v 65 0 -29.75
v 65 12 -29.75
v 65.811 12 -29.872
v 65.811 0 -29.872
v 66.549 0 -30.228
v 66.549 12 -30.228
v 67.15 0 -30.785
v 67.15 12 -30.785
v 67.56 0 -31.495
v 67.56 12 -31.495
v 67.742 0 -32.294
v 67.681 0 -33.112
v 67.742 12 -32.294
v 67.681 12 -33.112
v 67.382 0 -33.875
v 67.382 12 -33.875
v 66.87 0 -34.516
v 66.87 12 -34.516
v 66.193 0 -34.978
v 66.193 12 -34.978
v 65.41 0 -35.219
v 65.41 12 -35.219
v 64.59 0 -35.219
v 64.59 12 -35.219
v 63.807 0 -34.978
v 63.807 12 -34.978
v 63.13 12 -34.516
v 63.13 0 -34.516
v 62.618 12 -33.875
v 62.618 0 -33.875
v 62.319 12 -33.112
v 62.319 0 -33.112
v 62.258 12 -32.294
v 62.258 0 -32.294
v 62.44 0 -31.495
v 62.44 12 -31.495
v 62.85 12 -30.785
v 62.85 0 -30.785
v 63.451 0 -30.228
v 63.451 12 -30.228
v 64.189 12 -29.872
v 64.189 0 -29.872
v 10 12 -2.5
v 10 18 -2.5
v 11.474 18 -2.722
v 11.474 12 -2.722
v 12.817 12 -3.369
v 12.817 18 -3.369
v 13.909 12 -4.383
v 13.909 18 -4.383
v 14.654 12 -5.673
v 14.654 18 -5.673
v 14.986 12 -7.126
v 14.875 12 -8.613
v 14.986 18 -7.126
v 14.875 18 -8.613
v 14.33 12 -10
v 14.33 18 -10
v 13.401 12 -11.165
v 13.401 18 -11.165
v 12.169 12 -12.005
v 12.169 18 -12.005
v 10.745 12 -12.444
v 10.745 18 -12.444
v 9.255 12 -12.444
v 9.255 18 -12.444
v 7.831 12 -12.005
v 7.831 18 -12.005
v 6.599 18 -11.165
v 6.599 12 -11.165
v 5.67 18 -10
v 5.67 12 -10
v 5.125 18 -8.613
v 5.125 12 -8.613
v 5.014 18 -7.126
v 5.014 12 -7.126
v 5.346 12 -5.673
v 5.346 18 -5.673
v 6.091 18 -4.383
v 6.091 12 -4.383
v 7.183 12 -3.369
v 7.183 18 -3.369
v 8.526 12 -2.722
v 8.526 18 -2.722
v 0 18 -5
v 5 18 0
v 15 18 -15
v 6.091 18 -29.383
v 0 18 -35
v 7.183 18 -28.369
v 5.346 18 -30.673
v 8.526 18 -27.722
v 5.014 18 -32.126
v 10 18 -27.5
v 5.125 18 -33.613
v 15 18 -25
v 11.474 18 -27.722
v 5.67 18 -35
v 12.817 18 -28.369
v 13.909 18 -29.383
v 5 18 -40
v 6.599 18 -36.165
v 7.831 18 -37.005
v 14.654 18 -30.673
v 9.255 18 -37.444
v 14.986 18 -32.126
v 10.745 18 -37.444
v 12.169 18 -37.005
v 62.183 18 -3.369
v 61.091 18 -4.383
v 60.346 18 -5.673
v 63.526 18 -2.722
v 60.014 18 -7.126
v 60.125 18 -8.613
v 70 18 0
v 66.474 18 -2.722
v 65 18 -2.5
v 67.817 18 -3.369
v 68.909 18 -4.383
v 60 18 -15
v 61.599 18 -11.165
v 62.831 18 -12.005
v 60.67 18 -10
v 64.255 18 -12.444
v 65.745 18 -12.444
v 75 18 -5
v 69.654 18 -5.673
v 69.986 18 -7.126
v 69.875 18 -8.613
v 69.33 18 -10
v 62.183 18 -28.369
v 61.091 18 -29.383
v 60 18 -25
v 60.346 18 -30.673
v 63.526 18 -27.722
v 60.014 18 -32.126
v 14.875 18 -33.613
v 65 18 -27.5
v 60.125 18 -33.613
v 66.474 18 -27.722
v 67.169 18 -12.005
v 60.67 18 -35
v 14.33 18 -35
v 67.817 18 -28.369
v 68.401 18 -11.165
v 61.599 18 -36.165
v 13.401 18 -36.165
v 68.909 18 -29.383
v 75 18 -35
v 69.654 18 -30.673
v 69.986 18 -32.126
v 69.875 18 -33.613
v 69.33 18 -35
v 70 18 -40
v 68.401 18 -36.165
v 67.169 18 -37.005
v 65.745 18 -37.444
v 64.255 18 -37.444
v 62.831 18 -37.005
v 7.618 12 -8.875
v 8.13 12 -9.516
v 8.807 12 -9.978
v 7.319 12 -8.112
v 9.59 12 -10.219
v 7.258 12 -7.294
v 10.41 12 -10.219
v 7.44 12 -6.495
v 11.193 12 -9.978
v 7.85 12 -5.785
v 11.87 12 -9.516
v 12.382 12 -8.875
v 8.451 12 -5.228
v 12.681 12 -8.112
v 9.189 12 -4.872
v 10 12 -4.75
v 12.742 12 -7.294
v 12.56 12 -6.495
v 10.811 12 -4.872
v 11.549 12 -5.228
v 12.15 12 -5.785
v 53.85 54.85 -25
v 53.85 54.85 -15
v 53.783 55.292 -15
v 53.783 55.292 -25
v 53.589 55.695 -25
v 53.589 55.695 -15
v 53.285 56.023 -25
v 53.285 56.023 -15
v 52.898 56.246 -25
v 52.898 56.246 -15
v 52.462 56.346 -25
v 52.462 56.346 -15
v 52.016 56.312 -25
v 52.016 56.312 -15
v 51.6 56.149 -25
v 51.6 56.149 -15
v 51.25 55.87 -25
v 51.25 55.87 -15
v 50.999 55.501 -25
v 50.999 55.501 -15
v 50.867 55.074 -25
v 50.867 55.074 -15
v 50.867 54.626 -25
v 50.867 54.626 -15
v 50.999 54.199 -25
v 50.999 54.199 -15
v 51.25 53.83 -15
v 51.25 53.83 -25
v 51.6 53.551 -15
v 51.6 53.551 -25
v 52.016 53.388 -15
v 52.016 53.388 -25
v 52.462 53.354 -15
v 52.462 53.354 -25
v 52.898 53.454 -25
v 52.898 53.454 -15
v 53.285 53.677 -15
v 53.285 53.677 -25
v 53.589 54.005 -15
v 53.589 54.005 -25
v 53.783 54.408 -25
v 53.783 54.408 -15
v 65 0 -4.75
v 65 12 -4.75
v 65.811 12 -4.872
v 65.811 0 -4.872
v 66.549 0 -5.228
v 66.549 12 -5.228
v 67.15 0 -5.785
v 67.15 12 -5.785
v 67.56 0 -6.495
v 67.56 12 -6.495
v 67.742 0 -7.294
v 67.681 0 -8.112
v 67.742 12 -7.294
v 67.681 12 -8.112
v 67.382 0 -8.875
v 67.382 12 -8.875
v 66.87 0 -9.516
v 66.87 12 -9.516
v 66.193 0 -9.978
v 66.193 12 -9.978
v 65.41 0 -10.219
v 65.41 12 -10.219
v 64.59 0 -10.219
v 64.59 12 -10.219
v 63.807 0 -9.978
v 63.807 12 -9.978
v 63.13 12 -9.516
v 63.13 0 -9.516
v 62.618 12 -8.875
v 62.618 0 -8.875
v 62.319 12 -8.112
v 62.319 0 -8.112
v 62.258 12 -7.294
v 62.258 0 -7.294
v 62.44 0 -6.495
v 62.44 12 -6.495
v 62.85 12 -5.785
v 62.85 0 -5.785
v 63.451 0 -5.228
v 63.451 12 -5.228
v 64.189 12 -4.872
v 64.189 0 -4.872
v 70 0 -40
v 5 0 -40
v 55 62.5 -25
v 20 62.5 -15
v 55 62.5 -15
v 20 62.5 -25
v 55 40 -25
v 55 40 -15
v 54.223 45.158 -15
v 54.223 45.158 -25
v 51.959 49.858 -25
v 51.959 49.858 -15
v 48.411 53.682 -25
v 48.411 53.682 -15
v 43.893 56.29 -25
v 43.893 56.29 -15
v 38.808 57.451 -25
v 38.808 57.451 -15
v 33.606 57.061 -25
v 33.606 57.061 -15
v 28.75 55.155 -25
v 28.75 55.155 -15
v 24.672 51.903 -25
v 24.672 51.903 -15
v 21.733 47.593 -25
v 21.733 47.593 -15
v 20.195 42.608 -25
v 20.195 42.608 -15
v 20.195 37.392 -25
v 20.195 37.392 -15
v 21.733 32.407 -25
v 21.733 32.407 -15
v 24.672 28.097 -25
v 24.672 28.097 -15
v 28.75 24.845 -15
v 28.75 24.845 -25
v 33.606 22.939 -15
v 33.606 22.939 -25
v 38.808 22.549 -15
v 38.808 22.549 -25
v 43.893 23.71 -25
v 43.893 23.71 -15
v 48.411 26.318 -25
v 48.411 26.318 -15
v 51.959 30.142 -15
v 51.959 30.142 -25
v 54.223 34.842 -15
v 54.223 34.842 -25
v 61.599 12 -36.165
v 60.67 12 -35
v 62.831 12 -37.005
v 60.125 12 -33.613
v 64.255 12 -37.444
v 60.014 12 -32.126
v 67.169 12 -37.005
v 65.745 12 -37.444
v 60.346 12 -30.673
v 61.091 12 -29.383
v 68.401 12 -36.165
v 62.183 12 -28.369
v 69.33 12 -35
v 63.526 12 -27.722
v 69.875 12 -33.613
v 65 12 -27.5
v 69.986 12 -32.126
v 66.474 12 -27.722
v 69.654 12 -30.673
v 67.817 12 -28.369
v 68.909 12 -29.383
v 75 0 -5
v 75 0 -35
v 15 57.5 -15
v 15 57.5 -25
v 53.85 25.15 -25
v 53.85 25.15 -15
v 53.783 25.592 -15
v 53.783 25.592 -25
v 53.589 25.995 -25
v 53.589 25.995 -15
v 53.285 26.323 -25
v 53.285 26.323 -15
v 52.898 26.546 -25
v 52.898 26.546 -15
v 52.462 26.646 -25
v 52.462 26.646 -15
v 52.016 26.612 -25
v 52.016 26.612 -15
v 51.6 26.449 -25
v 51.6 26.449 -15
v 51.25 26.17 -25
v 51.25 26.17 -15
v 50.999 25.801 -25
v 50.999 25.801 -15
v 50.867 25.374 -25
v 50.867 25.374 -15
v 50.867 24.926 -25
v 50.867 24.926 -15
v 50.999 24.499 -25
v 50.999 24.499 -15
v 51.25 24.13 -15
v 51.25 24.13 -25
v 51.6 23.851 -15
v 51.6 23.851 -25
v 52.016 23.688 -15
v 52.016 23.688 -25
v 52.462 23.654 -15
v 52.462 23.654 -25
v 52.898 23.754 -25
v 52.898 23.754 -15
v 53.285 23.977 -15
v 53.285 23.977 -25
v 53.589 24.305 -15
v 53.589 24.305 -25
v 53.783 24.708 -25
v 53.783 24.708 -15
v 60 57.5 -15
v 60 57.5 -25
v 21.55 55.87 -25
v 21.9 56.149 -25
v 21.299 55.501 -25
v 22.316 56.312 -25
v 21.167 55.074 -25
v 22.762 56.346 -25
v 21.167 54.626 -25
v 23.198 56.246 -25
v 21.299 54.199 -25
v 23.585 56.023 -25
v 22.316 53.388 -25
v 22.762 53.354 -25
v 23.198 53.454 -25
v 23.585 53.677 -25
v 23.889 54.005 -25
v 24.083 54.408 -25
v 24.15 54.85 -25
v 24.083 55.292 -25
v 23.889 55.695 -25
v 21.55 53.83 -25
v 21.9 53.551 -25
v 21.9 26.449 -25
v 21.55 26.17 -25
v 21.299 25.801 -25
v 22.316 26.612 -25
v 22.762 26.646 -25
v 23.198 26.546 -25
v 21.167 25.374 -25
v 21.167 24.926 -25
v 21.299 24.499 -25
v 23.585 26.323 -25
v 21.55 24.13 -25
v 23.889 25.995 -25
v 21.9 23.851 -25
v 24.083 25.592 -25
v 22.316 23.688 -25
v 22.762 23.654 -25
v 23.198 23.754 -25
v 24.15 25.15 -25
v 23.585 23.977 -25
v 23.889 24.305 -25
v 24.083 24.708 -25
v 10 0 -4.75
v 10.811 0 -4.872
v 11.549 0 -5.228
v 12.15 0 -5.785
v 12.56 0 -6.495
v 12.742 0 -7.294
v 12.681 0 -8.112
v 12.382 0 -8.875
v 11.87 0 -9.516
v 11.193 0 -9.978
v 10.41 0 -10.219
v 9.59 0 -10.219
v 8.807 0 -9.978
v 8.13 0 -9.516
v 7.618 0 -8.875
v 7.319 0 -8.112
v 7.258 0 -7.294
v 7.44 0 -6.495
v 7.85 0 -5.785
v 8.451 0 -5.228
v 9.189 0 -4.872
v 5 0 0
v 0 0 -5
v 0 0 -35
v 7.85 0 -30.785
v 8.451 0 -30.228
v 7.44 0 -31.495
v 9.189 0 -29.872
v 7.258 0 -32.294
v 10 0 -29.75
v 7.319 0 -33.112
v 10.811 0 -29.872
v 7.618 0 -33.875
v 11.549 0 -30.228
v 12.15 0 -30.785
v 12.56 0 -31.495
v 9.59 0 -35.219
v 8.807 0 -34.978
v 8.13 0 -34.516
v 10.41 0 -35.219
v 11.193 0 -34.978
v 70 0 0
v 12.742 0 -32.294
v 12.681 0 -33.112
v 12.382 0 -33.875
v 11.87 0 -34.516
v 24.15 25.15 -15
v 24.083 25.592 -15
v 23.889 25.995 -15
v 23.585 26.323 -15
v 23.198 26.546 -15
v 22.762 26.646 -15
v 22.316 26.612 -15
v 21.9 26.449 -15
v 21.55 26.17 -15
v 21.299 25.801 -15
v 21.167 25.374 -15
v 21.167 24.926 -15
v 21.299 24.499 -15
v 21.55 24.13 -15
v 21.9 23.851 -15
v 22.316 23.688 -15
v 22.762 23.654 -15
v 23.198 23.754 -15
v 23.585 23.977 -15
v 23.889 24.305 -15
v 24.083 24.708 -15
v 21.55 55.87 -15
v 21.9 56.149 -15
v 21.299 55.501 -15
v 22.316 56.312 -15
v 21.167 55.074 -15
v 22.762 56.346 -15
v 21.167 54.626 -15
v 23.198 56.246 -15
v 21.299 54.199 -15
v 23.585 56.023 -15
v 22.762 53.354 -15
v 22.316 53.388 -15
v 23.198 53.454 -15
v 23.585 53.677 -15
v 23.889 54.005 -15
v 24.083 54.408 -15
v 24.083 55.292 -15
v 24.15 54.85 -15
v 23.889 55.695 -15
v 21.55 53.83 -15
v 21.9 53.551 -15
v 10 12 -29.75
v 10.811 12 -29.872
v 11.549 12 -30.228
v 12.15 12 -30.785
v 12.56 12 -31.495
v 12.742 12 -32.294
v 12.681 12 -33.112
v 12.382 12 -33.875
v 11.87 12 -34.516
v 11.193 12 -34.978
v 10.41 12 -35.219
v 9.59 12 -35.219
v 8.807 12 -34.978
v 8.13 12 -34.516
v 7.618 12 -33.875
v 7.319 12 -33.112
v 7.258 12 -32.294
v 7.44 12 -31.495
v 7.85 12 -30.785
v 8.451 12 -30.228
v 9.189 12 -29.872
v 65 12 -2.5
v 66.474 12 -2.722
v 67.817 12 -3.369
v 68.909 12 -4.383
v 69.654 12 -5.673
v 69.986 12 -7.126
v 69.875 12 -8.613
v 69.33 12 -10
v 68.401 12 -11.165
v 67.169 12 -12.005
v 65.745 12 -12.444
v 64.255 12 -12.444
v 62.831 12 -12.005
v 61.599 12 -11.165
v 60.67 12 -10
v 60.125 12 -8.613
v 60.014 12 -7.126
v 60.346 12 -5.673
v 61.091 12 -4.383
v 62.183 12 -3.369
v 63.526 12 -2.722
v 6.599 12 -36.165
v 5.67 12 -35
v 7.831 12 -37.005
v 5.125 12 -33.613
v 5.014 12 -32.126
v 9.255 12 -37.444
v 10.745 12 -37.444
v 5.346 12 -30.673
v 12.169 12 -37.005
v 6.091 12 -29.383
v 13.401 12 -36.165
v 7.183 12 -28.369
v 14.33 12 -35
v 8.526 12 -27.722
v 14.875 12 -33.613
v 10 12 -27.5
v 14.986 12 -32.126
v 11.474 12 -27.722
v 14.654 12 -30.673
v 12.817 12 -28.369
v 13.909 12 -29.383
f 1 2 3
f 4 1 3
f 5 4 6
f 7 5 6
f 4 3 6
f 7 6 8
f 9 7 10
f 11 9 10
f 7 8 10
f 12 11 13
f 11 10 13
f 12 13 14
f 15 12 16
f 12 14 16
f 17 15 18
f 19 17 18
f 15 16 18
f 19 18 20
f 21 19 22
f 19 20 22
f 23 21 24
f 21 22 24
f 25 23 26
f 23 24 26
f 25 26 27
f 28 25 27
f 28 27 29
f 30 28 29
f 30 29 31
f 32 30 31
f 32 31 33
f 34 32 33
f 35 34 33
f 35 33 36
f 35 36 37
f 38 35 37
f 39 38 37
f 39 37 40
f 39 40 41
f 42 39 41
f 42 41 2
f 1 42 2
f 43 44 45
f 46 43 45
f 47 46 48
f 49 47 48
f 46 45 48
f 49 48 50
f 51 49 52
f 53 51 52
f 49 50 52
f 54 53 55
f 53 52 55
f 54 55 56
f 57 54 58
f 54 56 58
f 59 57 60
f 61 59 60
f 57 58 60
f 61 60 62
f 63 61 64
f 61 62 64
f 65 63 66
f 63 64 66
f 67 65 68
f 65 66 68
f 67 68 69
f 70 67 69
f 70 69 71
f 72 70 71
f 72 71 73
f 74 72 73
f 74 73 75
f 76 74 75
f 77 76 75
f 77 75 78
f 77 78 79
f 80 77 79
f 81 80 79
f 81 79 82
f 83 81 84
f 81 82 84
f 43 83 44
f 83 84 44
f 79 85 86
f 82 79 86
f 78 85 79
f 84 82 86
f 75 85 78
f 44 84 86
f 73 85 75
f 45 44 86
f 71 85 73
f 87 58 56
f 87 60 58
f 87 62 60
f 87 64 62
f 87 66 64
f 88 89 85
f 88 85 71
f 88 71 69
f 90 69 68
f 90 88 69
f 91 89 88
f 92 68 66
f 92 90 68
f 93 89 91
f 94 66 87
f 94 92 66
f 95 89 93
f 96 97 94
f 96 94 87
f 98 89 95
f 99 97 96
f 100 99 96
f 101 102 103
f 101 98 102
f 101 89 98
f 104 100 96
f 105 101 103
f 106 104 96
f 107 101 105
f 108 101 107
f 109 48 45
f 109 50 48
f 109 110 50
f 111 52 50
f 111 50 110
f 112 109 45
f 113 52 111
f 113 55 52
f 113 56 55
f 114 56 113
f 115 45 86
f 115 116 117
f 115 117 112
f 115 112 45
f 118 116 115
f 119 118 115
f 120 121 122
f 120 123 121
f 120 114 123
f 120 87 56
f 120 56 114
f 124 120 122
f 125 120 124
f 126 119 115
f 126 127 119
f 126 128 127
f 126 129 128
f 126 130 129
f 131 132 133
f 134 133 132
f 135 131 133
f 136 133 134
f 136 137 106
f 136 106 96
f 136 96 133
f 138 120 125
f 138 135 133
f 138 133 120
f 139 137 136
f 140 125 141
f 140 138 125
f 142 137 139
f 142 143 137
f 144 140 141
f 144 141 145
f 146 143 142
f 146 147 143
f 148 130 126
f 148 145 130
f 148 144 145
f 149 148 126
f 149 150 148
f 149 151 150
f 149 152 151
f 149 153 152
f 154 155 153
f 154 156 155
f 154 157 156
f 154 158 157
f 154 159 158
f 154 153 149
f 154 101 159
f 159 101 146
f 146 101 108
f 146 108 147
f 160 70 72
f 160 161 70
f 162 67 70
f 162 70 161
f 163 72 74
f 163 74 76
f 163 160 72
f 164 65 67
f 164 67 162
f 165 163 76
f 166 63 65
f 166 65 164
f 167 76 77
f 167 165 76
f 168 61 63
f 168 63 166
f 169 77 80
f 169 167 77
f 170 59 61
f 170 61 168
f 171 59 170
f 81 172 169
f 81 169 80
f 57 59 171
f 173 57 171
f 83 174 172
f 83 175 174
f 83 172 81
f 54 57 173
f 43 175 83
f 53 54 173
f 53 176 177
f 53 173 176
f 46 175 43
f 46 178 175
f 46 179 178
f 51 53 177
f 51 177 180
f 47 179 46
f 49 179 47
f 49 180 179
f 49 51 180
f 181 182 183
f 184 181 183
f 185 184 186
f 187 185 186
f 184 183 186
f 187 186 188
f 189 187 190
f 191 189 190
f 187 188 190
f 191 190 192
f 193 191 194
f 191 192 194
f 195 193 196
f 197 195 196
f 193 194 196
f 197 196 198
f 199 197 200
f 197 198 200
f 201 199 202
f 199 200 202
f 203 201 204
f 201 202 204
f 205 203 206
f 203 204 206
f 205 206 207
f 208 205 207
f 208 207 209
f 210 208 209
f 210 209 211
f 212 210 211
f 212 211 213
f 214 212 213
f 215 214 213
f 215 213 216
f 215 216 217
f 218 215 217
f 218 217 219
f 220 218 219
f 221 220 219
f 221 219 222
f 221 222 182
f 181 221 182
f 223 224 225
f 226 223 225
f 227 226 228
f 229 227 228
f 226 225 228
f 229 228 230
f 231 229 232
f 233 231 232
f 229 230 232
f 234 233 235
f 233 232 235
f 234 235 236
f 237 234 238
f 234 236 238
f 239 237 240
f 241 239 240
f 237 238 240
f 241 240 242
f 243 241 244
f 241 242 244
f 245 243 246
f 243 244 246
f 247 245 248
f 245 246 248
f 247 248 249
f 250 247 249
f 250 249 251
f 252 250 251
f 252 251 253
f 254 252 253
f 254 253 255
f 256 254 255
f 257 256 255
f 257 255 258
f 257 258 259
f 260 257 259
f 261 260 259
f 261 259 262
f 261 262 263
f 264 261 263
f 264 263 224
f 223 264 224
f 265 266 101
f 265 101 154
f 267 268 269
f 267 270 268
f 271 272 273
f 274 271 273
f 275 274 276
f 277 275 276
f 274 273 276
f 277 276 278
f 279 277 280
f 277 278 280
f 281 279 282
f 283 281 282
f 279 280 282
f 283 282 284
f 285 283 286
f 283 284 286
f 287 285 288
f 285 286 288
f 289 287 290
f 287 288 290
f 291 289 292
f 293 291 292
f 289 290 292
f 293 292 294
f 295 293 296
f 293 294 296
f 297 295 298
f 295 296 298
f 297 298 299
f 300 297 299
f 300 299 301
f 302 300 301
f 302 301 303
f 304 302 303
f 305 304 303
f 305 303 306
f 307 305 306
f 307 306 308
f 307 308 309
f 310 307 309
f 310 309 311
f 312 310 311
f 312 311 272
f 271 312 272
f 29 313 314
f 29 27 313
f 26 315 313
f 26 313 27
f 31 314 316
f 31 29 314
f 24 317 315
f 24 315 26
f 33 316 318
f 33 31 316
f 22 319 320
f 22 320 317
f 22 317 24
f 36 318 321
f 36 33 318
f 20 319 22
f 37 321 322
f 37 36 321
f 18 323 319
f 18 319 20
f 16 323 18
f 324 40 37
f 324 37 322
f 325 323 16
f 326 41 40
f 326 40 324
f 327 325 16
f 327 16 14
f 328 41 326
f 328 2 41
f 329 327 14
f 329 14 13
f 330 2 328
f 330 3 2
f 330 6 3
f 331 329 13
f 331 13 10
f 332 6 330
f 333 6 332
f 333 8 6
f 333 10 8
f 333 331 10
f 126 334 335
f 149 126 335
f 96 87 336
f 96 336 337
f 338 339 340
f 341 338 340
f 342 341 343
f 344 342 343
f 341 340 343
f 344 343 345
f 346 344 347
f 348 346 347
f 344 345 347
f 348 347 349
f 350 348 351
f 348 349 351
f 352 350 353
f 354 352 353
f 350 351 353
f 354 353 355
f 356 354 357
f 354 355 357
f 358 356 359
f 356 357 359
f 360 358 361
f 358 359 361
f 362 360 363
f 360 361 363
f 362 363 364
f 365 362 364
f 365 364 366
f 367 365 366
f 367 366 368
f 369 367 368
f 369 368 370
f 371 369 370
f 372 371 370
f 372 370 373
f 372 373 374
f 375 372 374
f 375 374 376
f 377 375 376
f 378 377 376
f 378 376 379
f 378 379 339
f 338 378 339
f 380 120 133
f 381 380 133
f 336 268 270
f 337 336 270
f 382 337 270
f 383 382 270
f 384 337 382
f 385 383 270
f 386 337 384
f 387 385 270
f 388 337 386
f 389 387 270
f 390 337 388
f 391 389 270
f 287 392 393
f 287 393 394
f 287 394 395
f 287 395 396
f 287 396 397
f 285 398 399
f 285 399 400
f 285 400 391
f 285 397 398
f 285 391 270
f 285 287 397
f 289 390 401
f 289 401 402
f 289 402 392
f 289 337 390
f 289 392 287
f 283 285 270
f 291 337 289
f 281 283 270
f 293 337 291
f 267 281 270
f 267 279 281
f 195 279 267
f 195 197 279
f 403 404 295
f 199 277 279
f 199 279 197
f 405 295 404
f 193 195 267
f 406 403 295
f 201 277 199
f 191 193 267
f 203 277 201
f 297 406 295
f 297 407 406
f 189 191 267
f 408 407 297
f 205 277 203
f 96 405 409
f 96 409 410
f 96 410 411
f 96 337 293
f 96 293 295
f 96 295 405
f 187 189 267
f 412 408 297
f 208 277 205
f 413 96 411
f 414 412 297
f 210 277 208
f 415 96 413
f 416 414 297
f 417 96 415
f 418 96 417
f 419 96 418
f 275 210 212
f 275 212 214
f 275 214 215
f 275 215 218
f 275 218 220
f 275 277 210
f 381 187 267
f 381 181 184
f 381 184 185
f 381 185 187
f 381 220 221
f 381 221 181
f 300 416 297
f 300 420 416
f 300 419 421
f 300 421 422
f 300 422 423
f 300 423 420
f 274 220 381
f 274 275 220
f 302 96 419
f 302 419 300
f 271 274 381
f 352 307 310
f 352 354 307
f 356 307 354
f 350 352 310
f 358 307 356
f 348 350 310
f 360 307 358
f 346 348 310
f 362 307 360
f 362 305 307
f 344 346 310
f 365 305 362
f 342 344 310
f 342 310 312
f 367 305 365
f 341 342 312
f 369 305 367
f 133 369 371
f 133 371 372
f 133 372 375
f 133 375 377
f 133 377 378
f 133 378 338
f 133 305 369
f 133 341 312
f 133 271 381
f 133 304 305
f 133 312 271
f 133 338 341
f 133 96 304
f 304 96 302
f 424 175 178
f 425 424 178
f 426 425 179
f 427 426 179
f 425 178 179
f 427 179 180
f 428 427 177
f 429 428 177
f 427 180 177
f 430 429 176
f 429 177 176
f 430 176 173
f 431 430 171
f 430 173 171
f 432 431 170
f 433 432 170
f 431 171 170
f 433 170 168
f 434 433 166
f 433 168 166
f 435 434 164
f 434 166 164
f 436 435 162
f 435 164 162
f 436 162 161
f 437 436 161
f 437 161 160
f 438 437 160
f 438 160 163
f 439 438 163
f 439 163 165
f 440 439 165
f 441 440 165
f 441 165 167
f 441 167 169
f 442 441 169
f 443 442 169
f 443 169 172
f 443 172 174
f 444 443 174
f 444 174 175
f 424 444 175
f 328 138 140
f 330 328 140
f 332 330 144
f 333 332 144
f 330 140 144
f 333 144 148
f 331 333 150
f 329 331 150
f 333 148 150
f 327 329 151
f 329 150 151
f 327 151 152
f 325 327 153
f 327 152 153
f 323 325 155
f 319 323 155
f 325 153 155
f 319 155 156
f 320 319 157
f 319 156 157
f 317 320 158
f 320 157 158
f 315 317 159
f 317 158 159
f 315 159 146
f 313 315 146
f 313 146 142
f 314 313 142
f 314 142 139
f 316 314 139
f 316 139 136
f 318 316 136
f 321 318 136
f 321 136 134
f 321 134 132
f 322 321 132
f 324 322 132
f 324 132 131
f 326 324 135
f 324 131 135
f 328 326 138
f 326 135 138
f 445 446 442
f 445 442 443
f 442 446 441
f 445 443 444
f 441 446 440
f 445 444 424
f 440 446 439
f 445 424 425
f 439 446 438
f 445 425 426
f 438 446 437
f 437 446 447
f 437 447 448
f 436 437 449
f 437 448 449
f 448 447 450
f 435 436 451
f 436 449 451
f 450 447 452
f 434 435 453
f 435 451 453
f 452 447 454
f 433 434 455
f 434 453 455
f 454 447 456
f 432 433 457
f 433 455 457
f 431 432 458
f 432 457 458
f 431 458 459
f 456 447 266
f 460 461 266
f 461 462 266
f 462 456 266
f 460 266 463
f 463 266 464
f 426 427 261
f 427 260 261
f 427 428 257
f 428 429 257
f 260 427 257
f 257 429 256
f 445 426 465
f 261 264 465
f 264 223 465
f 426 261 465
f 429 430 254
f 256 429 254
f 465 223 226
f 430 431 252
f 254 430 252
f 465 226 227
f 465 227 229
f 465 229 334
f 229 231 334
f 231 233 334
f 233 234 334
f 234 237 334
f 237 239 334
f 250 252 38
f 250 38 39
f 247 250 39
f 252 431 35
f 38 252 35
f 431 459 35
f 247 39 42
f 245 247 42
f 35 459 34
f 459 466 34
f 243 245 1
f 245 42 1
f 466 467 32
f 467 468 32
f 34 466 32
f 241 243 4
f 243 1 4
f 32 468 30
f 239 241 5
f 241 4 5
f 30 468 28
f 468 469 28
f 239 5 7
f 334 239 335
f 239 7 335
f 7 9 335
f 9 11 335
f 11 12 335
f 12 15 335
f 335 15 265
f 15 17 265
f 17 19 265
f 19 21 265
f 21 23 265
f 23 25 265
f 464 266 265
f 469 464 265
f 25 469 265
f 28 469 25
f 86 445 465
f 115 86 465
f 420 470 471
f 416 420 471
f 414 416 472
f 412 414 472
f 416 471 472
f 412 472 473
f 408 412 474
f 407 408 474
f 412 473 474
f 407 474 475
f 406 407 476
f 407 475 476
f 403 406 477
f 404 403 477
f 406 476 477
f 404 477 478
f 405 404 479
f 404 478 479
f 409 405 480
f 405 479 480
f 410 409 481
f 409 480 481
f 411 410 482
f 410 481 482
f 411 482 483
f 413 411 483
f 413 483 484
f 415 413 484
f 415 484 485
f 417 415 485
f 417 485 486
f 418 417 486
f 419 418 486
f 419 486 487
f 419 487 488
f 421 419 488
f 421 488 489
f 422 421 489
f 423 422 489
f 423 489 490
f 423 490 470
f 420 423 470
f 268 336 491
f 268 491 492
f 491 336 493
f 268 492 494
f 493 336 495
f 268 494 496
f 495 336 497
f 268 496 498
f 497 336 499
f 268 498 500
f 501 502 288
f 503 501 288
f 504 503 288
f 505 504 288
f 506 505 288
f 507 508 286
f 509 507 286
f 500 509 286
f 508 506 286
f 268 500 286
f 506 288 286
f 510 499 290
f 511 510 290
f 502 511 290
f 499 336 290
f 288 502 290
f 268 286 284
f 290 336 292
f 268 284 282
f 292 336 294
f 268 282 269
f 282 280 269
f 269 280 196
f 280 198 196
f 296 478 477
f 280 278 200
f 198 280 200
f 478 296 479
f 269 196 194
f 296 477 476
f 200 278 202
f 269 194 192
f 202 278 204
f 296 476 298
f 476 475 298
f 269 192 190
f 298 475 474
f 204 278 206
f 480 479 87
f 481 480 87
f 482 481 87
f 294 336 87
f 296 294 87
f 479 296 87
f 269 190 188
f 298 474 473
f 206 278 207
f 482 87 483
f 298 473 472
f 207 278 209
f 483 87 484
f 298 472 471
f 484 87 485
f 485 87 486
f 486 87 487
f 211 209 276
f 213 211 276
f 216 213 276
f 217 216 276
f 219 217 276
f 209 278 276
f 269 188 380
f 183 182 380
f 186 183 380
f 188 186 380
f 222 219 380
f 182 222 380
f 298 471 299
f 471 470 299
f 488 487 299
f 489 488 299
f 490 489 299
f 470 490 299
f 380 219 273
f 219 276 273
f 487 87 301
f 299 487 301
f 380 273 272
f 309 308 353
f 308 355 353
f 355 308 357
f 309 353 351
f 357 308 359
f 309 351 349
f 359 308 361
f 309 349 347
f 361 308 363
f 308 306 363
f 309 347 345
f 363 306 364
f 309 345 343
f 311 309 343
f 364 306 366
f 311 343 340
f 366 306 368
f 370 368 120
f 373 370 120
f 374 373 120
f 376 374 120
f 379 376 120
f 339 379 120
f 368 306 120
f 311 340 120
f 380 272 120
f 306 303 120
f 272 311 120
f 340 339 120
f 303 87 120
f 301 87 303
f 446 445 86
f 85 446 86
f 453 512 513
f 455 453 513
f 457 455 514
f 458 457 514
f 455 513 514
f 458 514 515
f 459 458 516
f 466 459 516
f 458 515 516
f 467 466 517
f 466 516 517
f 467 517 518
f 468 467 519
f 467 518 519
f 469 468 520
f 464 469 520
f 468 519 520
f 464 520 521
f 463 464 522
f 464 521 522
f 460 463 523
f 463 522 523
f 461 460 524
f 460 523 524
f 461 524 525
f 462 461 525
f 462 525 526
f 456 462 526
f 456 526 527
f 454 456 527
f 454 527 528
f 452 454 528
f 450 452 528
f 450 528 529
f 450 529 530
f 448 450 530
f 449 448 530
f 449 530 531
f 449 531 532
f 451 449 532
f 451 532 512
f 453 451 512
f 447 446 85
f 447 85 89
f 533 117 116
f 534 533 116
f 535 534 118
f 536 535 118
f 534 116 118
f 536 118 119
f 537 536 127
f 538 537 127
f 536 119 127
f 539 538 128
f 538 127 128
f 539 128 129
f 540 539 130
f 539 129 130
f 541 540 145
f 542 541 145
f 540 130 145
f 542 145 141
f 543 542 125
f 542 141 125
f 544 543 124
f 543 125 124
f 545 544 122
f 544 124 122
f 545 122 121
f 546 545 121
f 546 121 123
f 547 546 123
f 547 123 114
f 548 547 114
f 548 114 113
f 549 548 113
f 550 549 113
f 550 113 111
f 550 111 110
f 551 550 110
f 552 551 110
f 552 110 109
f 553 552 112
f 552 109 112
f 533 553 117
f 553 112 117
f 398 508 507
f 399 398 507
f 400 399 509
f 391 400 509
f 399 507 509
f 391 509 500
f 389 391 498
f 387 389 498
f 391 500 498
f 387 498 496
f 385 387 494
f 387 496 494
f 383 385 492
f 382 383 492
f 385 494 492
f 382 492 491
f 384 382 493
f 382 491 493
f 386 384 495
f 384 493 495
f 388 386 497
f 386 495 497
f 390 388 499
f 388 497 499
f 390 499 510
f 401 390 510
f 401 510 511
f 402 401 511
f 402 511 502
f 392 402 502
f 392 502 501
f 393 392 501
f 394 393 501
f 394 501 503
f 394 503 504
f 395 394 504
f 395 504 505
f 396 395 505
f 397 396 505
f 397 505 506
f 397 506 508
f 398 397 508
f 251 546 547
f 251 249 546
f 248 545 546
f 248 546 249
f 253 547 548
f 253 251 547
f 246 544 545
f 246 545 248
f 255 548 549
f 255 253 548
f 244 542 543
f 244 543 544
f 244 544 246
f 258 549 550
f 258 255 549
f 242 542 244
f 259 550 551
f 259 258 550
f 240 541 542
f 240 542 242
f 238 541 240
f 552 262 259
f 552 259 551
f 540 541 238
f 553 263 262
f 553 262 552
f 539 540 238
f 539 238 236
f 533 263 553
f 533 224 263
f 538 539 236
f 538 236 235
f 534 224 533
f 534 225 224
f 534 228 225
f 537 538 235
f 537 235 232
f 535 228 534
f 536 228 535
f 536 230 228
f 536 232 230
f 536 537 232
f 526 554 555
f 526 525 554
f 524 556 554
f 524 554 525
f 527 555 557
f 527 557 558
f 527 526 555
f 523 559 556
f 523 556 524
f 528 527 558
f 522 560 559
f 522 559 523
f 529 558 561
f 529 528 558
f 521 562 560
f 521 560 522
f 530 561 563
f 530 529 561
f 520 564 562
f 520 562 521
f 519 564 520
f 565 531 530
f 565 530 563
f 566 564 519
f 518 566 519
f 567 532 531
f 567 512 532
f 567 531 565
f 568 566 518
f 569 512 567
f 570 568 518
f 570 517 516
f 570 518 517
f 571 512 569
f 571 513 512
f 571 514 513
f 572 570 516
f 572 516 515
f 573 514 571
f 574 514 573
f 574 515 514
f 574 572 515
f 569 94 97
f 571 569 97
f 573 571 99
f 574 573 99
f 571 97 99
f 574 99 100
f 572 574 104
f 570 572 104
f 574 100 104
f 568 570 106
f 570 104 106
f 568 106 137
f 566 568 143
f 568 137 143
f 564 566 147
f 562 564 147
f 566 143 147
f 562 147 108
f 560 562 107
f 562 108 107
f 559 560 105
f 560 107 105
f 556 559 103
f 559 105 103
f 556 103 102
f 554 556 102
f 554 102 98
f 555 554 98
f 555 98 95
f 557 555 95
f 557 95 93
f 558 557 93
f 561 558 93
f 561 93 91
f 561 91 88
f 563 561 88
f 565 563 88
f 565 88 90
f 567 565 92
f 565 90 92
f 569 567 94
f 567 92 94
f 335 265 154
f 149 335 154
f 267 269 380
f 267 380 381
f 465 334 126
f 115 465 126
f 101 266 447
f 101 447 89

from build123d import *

# Parameters (mm, degrees)
SKETCH_1_W          = 75
SKETCH_1_H          = 40
EXTRUDE_1_DEPTH     = 18
CHAMFER_1_SIZE      = 5
SKETCH_2_W          = 45
SKETCH_2_H          = 10
EXTRUDE_2_DEPTH     = 44.5
CHAMFER_2_SIZE      = 5
SKETCH_3_R          = 17.5
CUT_EXTRUDE_1_DEPTH = 101.778221854
SKETCH_4_R          = 1.5
CUT_EXTRUDE_2_DEPTH = 101.778221854
SKETCH_5_R          = 5
CUT_EXTRUDE_3_DEPTH = 6
SKETCH_6_R          = 2.75
CUT_EXTRUDE_4_DEPTH = 99.869863963


with BuildPart() as part:
    # 스케치1 → 보스-돌출1 (new body)
    with BuildSketch(Plane(origin=(0, 0, 0), x_dir=(1, 0, 0), z_dir=(0, 1, 0))):
        with Locations((37.5, 20)):
            Rectangle(SKETCH_1_W, SKETCH_1_H)
    extrude(amount=EXTRUDE_1_DEPTH)

    # 모따기1
    chamfer_1_edges = [part.edges().sort_by_distance(p)[0] for p in [
        (0, 9, -40),
        (75, 9, -40),
        (75, 9, 0),
        (0, 9, 0),
    ]]
    chamfer(chamfer_1_edges, length=CHAMFER_1_SIZE)

    # 스케치2 → 보스-돌출2 (add)
    with BuildSketch(Plane(origin=(0, 18, 0), x_dir=(1, 0, 0), z_dir=(0, 1, 0))):
        with Locations((37.5, 20)):
            Rectangle(SKETCH_2_W, SKETCH_2_H)
    extrude(amount=EXTRUDE_2_DEPTH)

    # 모따기2
    chamfer_2_edges = [part.edges().sort_by_distance(p)[0] for p in [
        (15, 62.5, -20),
        (60, 62.5, -20),
    ]]
    chamfer(chamfer_2_edges, length=CHAMFER_2_SIZE)

    # 스케치3 → 컷-돌출1 (cut, through all)
    with BuildSketch(Plane.XY.offset(-15)):
        with Locations((37.5, 40)):
            Circle(SKETCH_3_R)
    extrude(amount=-CUT_EXTRUDE_1_DEPTH, mode=Mode.SUBTRACT)

    # 스케치4 → 컷-돌출2 (cut, through all)
    with BuildSketch(Plane.XY.offset(-15)):
        with Locations((22.65, 54.85)):
            Circle(SKETCH_4_R)
        with Locations((52.35, 54.85)):
            Circle(SKETCH_4_R)
        with Locations((52.35, 25.15)):
            Circle(SKETCH_4_R)
        with Locations((22.65, 25.15)):
            Circle(SKETCH_4_R)
    extrude(amount=-CUT_EXTRUDE_2_DEPTH, mode=Mode.SUBTRACT)

    # 스케치5 → 컷-돌출3 (cut)
    with BuildSketch(Plane(origin=(0, 18, 0), x_dir=(1, 0, 0), z_dir=(0, 1, 0))):
        with Locations(Location((10, 32.5, 0), (0, 0, 270))):
            Circle(SKETCH_5_R)
        with Locations(Location((10, 7.5, 0), (0, 0, 270))):
            Circle(SKETCH_5_R)
        with Locations(Location((65, 7.5, 0), (0, 0, 270))):
            Circle(SKETCH_5_R)
        with Locations(Location((65, 32.5, 0), (0, 0, 270))):
            Circle(SKETCH_5_R)
    extrude(amount=-CUT_EXTRUDE_3_DEPTH, mode=Mode.SUBTRACT)

    # 스케치6 → 컷-돌출4 (cut, through all)
    with BuildSketch(Plane(origin=(0, 12, 0), x_dir=(1, 0, 0), z_dir=(0, 1, 0))):
        with Locations(Location((10, 7.5, 0), (0, 0, 270))):
            Circle(SKETCH_6_R)
        with Locations(Location((10, 32.5, 0), (0, 0, 270))):
            Circle(SKETCH_6_R)
        with Locations(Location((65, 7.5, 0), (0, 0, 270))):
            Circle(SKETCH_6_R)
        with Locations(Location((65, 32.5, 0), (0, 0, 270))):
            Circle(SKETCH_6_R)
    extrude(amount=-CUT_EXTRUDE_4_DEPTH, mode=Mode.SUBTRACT)


solid = part.part
